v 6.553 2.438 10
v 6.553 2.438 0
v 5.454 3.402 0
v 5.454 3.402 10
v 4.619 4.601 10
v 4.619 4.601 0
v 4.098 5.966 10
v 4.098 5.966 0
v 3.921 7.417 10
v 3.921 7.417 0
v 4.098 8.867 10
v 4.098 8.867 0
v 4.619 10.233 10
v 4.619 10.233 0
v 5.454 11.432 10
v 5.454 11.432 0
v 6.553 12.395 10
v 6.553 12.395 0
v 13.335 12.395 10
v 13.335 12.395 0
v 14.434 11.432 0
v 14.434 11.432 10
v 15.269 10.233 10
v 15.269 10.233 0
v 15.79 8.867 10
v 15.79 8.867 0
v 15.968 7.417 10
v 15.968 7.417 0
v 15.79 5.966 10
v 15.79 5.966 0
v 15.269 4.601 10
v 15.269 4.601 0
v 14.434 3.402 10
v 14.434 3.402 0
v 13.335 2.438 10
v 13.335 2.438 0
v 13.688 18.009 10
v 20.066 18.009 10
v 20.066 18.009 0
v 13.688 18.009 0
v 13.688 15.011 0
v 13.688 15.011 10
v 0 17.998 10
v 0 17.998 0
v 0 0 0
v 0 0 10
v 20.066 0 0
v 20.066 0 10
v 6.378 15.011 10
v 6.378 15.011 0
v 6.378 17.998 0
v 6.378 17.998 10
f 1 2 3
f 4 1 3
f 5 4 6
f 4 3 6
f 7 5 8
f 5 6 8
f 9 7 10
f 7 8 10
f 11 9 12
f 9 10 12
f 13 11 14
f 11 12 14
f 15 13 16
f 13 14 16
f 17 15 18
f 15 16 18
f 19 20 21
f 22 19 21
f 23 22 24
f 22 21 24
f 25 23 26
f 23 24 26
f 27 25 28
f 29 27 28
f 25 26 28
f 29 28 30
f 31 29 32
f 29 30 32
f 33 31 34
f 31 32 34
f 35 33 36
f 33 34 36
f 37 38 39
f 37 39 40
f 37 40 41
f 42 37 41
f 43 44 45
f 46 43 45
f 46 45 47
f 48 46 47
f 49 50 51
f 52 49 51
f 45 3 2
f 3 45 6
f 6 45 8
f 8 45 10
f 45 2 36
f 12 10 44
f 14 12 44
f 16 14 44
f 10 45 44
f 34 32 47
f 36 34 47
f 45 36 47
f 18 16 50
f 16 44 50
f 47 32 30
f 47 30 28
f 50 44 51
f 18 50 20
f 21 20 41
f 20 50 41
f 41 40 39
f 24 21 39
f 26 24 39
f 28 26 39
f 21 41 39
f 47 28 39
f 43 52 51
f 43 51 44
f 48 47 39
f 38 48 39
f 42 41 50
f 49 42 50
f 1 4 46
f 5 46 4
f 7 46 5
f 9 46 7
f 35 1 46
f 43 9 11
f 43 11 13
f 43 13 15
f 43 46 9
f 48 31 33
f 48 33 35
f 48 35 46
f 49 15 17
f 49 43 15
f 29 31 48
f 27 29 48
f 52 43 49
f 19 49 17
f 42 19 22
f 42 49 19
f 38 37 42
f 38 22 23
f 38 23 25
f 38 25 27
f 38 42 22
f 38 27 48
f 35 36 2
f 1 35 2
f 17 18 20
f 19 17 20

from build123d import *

# Parameters (mm, degrees)
BOSS_EXTRUDE1_DEPTH = 10


with BuildPart() as part:
    # Sketch1 → Boss-Extrude1 (new body)
    with BuildSketch(Plane.XY):
        Polygon((0, 15.0114), (0, 0), (20.066, 0), (20.066, 15.0114), (20.066, 18.0086), (13.6884, 18.0086), (13.6884, 15.0114), (6.3776, 15.0114), (6.3776, 17.998004192), (0, 17.998004192), align=None)
        with BuildLine():
            Line((6.5532, 12.3952), (9.9441, 12.3952))
            Line((9.9441, 12.3952), (13.335, 12.3952))
            ThreePointArc((13.335, 12.3952), (15.967609722, 7.4168), (13.335, 2.4384))
            Line((13.335, 2.4384), (9.9441, 2.4384))
            Line((9.9441, 2.4384), (6.5532, 2.4384))
            ThreePointArc((6.5532, 2.4384), (3.920590278, 7.4168), (6.5532, 12.3952))
        make_face(mode=Mode.SUBTRACT)
    extrude(amount=BOSS_EXTRUDE1_DEPTH)


solid = part.part
